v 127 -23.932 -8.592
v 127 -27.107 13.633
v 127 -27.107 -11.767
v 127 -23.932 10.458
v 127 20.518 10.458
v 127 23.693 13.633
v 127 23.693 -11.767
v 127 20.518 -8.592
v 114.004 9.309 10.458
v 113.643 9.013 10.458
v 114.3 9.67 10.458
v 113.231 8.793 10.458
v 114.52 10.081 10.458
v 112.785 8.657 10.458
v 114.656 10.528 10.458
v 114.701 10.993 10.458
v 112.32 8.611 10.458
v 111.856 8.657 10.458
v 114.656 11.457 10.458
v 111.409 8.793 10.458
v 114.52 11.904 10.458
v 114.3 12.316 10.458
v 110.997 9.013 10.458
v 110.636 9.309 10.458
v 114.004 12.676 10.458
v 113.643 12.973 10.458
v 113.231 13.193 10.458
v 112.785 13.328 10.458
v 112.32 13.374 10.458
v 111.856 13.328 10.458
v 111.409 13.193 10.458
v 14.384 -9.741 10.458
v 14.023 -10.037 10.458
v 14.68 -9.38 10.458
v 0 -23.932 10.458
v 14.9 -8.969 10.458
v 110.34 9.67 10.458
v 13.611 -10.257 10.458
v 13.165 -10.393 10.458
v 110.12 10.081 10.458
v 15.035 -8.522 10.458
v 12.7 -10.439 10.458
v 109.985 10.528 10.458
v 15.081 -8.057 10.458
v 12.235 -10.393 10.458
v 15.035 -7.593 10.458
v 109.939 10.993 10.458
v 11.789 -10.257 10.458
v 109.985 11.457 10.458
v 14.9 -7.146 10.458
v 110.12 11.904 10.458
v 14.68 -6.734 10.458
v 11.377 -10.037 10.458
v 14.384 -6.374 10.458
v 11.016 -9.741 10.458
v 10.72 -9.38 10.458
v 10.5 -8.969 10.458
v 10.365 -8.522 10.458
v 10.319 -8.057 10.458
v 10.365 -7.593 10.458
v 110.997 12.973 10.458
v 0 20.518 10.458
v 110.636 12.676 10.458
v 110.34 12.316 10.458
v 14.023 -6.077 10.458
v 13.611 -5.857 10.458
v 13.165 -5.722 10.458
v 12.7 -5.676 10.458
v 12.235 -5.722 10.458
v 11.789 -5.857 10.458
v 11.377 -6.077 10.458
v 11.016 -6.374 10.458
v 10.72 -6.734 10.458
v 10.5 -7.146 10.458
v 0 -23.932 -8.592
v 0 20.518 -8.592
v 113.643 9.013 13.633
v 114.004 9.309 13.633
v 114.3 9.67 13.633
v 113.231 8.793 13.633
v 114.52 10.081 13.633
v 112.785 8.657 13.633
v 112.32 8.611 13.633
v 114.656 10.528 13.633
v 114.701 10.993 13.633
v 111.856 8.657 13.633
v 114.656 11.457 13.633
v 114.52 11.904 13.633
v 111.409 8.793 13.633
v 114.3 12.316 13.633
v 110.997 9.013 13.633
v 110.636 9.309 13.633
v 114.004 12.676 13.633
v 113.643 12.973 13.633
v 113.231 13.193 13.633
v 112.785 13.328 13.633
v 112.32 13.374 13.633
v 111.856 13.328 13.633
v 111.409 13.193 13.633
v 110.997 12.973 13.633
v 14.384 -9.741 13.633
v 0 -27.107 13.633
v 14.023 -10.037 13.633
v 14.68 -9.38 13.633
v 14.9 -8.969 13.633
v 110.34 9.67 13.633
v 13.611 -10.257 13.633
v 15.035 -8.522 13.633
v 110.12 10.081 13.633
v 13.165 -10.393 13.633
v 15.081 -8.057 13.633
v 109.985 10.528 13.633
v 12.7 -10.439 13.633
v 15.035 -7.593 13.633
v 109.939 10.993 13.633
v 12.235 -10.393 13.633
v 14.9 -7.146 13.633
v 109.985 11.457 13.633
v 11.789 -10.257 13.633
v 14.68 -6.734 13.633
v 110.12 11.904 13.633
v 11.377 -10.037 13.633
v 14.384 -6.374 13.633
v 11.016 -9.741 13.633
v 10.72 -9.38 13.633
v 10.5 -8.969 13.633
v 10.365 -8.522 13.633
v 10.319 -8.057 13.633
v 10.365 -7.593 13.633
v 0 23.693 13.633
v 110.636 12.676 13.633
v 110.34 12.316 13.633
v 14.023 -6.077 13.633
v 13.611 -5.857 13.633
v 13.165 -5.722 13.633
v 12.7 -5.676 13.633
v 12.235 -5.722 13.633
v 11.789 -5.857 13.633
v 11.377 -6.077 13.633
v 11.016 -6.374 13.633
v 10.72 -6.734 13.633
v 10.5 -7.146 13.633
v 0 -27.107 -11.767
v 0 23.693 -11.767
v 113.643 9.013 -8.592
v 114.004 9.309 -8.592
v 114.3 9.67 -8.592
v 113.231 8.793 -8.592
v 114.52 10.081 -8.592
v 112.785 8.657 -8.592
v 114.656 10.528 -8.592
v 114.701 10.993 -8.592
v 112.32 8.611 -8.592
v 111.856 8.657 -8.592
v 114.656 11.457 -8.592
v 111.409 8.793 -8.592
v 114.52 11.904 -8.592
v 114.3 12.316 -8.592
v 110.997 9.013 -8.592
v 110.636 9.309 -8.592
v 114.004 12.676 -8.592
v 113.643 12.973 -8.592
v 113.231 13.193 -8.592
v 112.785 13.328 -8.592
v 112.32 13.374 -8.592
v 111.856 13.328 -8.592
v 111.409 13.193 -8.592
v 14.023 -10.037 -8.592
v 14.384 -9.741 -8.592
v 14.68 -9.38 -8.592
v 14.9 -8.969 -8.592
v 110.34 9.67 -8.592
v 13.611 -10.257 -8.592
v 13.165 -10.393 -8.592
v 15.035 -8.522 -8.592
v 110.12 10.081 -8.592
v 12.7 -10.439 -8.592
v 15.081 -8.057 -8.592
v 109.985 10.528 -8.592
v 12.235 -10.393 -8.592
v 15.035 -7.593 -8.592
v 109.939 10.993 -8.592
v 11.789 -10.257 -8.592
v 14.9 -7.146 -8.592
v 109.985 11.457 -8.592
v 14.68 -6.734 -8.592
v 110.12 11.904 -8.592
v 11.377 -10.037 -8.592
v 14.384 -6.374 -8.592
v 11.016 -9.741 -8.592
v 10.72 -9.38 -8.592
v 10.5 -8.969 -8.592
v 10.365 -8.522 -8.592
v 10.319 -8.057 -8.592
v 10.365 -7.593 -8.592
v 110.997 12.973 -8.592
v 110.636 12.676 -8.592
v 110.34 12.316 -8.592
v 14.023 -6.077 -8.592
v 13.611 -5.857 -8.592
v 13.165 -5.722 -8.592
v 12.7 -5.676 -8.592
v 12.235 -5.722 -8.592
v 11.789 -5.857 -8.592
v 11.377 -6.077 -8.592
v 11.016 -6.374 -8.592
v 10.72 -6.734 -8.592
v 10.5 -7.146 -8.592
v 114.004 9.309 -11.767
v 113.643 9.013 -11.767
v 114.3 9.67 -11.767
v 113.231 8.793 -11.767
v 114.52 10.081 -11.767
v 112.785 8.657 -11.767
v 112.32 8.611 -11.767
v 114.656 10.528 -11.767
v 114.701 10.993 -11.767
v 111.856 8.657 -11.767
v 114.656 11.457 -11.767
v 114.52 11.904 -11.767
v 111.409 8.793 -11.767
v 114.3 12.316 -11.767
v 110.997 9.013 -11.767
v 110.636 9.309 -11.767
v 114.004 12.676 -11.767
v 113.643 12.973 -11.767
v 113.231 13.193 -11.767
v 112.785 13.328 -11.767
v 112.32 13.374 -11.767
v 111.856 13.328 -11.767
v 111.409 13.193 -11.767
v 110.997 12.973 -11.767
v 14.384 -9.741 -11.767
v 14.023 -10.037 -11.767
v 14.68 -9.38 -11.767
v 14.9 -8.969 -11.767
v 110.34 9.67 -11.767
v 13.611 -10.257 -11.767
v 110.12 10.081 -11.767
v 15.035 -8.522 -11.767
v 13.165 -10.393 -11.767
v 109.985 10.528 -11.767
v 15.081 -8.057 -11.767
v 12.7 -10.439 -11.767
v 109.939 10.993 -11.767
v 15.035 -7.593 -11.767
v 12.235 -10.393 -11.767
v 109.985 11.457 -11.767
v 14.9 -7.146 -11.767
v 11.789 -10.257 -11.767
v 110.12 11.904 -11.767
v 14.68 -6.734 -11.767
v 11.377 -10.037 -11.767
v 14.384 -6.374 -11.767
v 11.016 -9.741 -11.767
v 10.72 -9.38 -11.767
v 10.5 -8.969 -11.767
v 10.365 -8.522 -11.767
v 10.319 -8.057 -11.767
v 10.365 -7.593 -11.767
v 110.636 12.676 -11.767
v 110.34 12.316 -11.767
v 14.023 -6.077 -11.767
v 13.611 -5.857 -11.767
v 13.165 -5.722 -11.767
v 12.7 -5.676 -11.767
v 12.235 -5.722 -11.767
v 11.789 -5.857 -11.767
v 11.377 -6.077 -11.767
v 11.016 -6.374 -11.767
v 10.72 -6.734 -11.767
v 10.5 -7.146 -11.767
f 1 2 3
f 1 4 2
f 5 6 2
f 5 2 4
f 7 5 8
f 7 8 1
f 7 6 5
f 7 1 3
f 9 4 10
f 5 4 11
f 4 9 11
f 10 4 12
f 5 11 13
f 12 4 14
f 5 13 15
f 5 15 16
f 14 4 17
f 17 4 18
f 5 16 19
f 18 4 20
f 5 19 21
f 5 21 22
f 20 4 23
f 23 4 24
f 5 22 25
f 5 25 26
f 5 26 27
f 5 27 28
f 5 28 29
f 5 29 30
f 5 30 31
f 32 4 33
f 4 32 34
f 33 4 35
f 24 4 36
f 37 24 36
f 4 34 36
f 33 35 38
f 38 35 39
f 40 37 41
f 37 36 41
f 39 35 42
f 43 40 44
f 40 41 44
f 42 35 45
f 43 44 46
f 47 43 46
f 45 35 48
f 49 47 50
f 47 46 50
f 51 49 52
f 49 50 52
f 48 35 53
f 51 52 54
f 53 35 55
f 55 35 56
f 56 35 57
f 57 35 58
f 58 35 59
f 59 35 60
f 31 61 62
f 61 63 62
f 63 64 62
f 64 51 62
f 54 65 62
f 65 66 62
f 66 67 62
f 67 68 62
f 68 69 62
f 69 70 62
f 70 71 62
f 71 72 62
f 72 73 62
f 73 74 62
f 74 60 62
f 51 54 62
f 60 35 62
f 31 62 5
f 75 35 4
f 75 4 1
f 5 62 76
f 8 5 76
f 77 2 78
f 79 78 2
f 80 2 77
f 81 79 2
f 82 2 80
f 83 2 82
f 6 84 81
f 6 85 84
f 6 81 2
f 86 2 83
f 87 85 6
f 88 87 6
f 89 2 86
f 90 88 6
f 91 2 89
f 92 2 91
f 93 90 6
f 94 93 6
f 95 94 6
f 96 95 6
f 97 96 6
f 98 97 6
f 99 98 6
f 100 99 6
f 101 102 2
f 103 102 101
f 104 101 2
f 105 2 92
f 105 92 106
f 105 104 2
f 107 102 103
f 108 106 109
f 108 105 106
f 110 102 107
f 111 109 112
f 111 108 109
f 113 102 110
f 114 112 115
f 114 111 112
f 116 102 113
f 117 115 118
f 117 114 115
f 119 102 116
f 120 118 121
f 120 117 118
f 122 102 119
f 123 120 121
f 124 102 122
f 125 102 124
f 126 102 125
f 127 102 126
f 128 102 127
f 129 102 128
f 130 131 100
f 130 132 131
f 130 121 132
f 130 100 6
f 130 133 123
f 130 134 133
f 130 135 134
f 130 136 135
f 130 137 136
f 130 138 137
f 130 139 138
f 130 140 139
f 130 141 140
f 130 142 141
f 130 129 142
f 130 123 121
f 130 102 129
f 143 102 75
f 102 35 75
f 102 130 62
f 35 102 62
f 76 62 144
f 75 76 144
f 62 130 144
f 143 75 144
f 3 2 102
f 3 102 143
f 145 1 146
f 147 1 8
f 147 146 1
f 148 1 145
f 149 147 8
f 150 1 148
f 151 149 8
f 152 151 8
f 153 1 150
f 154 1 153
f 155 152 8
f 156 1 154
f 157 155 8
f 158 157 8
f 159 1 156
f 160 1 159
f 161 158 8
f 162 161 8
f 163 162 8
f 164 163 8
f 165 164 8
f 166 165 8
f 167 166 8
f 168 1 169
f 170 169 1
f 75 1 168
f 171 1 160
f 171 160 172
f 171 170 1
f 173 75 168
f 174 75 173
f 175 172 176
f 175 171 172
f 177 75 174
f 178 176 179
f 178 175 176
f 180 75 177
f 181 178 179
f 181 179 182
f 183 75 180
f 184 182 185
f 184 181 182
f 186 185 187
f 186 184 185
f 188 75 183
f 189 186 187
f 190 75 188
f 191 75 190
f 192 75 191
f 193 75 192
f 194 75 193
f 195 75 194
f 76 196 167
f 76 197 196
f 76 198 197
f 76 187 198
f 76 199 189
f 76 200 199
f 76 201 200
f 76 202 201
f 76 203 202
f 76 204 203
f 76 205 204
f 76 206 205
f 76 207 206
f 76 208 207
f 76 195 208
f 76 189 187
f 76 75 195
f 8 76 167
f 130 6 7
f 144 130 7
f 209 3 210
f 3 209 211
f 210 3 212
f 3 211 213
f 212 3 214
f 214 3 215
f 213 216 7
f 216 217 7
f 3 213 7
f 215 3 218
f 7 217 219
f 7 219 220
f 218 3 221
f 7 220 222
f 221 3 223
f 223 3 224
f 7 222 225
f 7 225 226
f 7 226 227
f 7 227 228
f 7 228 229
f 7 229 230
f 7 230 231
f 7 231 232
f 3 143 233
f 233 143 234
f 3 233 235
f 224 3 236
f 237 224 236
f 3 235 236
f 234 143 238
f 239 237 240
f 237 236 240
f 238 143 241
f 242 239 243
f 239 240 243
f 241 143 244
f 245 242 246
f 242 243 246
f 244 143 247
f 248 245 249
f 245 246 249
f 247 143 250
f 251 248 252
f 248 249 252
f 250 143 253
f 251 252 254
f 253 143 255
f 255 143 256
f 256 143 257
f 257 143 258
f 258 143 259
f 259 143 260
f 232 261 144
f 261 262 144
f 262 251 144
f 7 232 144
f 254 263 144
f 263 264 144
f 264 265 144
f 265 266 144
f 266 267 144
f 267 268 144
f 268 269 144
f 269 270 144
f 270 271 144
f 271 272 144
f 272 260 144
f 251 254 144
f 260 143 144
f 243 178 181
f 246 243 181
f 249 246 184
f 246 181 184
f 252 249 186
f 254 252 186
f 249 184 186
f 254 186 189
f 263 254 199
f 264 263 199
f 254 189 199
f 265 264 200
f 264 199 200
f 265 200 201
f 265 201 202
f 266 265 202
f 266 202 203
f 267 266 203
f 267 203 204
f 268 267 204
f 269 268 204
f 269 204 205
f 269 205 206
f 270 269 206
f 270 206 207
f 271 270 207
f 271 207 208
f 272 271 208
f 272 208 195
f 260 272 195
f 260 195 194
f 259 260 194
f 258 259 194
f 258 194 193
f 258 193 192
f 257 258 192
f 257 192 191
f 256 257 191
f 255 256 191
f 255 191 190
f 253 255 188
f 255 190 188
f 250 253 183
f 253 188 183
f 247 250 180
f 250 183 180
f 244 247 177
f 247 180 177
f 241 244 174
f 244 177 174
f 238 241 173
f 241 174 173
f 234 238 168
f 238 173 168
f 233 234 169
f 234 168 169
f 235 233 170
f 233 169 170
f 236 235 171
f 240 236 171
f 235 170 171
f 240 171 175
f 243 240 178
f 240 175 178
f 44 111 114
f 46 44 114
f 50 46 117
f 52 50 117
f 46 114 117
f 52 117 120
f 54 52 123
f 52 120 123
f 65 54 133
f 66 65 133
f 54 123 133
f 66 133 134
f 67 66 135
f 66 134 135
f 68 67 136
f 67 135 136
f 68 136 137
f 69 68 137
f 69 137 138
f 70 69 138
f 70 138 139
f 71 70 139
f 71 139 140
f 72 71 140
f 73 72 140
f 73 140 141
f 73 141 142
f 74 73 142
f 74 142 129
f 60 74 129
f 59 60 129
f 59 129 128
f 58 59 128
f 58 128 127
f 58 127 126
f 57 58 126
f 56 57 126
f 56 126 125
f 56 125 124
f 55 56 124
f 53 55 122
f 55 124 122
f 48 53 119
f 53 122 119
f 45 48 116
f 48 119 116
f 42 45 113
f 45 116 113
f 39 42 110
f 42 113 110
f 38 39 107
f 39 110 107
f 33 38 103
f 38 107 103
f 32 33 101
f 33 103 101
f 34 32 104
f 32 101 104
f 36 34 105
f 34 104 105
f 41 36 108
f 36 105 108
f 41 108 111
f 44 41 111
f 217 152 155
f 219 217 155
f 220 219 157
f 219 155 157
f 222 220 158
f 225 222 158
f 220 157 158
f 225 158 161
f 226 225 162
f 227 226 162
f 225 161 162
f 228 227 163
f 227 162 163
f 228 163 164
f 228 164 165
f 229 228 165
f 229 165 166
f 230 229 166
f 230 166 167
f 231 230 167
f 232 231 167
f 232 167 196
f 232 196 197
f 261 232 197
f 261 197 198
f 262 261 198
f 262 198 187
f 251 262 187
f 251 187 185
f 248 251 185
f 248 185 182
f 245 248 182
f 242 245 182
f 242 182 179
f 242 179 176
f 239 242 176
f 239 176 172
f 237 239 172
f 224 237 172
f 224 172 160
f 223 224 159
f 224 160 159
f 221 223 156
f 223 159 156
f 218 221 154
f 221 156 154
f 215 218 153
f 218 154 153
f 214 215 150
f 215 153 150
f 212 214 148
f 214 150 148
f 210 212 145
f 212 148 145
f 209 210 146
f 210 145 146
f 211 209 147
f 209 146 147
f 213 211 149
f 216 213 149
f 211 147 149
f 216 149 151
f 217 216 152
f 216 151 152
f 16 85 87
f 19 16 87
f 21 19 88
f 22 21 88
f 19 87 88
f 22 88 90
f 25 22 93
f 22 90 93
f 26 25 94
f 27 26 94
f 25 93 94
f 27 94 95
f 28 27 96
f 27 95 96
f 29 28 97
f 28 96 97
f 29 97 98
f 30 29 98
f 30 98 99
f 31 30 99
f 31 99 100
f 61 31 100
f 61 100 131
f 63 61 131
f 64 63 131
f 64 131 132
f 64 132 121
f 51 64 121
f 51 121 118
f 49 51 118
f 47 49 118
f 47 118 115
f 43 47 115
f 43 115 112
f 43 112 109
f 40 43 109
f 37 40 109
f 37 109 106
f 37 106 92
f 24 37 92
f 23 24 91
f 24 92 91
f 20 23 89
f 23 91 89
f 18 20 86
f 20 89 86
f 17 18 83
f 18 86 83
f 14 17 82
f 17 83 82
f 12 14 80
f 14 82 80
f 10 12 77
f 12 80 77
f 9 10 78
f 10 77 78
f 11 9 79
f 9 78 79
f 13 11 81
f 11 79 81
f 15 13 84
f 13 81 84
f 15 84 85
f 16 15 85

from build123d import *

# Parameters (mm, degrees)
SKETCH2_W           = 25.4
SKETCH2_H           = 50.8
SKETCH2_W_2         = 19.05
SKETCH2_H_2         = 44.45
BOSS_EXTRUDE1_DEPTH = 127
SKETCH4_R           = 2.38125
CUT_EXTRUDE2_DEPTH  = 25.4


with BuildPart() as part:
    # Sketch2 → Boss-Extrude1 (new body)
    with BuildSketch(Plane(origin=(0, 0, 0), x_dir=(0, 0, -1), z_dir=(1, 0, 0))):
        with Locations((-0.932940239, -1.707357918)):
            Rectangle(SKETCH2_W, SKETCH2_H)
        with Locations((-0.932940239, -1.707357918)):
            Rectangle(SKETCH2_W_2, SKETCH2_H_2, mode=Mode.SUBTRACT)
    extrude(amount=BOSS_EXTRUDE1_DEPTH)

    # Sketch4 → Cut-Extrude2 (cut)
    with BuildSketch(Plane.XY.offset(13.632940239)):
        with Locations((12.7, -8.057357918)):
            Circle(SKETCH4_R)
        with Locations((112.320186583, 10.992642082)):
            Circle(SKETCH4_R)
    extrude(amount=-CUT_EXTRUDE2_DEPTH, mode=Mode.SUBTRACT)


solid = part.part
